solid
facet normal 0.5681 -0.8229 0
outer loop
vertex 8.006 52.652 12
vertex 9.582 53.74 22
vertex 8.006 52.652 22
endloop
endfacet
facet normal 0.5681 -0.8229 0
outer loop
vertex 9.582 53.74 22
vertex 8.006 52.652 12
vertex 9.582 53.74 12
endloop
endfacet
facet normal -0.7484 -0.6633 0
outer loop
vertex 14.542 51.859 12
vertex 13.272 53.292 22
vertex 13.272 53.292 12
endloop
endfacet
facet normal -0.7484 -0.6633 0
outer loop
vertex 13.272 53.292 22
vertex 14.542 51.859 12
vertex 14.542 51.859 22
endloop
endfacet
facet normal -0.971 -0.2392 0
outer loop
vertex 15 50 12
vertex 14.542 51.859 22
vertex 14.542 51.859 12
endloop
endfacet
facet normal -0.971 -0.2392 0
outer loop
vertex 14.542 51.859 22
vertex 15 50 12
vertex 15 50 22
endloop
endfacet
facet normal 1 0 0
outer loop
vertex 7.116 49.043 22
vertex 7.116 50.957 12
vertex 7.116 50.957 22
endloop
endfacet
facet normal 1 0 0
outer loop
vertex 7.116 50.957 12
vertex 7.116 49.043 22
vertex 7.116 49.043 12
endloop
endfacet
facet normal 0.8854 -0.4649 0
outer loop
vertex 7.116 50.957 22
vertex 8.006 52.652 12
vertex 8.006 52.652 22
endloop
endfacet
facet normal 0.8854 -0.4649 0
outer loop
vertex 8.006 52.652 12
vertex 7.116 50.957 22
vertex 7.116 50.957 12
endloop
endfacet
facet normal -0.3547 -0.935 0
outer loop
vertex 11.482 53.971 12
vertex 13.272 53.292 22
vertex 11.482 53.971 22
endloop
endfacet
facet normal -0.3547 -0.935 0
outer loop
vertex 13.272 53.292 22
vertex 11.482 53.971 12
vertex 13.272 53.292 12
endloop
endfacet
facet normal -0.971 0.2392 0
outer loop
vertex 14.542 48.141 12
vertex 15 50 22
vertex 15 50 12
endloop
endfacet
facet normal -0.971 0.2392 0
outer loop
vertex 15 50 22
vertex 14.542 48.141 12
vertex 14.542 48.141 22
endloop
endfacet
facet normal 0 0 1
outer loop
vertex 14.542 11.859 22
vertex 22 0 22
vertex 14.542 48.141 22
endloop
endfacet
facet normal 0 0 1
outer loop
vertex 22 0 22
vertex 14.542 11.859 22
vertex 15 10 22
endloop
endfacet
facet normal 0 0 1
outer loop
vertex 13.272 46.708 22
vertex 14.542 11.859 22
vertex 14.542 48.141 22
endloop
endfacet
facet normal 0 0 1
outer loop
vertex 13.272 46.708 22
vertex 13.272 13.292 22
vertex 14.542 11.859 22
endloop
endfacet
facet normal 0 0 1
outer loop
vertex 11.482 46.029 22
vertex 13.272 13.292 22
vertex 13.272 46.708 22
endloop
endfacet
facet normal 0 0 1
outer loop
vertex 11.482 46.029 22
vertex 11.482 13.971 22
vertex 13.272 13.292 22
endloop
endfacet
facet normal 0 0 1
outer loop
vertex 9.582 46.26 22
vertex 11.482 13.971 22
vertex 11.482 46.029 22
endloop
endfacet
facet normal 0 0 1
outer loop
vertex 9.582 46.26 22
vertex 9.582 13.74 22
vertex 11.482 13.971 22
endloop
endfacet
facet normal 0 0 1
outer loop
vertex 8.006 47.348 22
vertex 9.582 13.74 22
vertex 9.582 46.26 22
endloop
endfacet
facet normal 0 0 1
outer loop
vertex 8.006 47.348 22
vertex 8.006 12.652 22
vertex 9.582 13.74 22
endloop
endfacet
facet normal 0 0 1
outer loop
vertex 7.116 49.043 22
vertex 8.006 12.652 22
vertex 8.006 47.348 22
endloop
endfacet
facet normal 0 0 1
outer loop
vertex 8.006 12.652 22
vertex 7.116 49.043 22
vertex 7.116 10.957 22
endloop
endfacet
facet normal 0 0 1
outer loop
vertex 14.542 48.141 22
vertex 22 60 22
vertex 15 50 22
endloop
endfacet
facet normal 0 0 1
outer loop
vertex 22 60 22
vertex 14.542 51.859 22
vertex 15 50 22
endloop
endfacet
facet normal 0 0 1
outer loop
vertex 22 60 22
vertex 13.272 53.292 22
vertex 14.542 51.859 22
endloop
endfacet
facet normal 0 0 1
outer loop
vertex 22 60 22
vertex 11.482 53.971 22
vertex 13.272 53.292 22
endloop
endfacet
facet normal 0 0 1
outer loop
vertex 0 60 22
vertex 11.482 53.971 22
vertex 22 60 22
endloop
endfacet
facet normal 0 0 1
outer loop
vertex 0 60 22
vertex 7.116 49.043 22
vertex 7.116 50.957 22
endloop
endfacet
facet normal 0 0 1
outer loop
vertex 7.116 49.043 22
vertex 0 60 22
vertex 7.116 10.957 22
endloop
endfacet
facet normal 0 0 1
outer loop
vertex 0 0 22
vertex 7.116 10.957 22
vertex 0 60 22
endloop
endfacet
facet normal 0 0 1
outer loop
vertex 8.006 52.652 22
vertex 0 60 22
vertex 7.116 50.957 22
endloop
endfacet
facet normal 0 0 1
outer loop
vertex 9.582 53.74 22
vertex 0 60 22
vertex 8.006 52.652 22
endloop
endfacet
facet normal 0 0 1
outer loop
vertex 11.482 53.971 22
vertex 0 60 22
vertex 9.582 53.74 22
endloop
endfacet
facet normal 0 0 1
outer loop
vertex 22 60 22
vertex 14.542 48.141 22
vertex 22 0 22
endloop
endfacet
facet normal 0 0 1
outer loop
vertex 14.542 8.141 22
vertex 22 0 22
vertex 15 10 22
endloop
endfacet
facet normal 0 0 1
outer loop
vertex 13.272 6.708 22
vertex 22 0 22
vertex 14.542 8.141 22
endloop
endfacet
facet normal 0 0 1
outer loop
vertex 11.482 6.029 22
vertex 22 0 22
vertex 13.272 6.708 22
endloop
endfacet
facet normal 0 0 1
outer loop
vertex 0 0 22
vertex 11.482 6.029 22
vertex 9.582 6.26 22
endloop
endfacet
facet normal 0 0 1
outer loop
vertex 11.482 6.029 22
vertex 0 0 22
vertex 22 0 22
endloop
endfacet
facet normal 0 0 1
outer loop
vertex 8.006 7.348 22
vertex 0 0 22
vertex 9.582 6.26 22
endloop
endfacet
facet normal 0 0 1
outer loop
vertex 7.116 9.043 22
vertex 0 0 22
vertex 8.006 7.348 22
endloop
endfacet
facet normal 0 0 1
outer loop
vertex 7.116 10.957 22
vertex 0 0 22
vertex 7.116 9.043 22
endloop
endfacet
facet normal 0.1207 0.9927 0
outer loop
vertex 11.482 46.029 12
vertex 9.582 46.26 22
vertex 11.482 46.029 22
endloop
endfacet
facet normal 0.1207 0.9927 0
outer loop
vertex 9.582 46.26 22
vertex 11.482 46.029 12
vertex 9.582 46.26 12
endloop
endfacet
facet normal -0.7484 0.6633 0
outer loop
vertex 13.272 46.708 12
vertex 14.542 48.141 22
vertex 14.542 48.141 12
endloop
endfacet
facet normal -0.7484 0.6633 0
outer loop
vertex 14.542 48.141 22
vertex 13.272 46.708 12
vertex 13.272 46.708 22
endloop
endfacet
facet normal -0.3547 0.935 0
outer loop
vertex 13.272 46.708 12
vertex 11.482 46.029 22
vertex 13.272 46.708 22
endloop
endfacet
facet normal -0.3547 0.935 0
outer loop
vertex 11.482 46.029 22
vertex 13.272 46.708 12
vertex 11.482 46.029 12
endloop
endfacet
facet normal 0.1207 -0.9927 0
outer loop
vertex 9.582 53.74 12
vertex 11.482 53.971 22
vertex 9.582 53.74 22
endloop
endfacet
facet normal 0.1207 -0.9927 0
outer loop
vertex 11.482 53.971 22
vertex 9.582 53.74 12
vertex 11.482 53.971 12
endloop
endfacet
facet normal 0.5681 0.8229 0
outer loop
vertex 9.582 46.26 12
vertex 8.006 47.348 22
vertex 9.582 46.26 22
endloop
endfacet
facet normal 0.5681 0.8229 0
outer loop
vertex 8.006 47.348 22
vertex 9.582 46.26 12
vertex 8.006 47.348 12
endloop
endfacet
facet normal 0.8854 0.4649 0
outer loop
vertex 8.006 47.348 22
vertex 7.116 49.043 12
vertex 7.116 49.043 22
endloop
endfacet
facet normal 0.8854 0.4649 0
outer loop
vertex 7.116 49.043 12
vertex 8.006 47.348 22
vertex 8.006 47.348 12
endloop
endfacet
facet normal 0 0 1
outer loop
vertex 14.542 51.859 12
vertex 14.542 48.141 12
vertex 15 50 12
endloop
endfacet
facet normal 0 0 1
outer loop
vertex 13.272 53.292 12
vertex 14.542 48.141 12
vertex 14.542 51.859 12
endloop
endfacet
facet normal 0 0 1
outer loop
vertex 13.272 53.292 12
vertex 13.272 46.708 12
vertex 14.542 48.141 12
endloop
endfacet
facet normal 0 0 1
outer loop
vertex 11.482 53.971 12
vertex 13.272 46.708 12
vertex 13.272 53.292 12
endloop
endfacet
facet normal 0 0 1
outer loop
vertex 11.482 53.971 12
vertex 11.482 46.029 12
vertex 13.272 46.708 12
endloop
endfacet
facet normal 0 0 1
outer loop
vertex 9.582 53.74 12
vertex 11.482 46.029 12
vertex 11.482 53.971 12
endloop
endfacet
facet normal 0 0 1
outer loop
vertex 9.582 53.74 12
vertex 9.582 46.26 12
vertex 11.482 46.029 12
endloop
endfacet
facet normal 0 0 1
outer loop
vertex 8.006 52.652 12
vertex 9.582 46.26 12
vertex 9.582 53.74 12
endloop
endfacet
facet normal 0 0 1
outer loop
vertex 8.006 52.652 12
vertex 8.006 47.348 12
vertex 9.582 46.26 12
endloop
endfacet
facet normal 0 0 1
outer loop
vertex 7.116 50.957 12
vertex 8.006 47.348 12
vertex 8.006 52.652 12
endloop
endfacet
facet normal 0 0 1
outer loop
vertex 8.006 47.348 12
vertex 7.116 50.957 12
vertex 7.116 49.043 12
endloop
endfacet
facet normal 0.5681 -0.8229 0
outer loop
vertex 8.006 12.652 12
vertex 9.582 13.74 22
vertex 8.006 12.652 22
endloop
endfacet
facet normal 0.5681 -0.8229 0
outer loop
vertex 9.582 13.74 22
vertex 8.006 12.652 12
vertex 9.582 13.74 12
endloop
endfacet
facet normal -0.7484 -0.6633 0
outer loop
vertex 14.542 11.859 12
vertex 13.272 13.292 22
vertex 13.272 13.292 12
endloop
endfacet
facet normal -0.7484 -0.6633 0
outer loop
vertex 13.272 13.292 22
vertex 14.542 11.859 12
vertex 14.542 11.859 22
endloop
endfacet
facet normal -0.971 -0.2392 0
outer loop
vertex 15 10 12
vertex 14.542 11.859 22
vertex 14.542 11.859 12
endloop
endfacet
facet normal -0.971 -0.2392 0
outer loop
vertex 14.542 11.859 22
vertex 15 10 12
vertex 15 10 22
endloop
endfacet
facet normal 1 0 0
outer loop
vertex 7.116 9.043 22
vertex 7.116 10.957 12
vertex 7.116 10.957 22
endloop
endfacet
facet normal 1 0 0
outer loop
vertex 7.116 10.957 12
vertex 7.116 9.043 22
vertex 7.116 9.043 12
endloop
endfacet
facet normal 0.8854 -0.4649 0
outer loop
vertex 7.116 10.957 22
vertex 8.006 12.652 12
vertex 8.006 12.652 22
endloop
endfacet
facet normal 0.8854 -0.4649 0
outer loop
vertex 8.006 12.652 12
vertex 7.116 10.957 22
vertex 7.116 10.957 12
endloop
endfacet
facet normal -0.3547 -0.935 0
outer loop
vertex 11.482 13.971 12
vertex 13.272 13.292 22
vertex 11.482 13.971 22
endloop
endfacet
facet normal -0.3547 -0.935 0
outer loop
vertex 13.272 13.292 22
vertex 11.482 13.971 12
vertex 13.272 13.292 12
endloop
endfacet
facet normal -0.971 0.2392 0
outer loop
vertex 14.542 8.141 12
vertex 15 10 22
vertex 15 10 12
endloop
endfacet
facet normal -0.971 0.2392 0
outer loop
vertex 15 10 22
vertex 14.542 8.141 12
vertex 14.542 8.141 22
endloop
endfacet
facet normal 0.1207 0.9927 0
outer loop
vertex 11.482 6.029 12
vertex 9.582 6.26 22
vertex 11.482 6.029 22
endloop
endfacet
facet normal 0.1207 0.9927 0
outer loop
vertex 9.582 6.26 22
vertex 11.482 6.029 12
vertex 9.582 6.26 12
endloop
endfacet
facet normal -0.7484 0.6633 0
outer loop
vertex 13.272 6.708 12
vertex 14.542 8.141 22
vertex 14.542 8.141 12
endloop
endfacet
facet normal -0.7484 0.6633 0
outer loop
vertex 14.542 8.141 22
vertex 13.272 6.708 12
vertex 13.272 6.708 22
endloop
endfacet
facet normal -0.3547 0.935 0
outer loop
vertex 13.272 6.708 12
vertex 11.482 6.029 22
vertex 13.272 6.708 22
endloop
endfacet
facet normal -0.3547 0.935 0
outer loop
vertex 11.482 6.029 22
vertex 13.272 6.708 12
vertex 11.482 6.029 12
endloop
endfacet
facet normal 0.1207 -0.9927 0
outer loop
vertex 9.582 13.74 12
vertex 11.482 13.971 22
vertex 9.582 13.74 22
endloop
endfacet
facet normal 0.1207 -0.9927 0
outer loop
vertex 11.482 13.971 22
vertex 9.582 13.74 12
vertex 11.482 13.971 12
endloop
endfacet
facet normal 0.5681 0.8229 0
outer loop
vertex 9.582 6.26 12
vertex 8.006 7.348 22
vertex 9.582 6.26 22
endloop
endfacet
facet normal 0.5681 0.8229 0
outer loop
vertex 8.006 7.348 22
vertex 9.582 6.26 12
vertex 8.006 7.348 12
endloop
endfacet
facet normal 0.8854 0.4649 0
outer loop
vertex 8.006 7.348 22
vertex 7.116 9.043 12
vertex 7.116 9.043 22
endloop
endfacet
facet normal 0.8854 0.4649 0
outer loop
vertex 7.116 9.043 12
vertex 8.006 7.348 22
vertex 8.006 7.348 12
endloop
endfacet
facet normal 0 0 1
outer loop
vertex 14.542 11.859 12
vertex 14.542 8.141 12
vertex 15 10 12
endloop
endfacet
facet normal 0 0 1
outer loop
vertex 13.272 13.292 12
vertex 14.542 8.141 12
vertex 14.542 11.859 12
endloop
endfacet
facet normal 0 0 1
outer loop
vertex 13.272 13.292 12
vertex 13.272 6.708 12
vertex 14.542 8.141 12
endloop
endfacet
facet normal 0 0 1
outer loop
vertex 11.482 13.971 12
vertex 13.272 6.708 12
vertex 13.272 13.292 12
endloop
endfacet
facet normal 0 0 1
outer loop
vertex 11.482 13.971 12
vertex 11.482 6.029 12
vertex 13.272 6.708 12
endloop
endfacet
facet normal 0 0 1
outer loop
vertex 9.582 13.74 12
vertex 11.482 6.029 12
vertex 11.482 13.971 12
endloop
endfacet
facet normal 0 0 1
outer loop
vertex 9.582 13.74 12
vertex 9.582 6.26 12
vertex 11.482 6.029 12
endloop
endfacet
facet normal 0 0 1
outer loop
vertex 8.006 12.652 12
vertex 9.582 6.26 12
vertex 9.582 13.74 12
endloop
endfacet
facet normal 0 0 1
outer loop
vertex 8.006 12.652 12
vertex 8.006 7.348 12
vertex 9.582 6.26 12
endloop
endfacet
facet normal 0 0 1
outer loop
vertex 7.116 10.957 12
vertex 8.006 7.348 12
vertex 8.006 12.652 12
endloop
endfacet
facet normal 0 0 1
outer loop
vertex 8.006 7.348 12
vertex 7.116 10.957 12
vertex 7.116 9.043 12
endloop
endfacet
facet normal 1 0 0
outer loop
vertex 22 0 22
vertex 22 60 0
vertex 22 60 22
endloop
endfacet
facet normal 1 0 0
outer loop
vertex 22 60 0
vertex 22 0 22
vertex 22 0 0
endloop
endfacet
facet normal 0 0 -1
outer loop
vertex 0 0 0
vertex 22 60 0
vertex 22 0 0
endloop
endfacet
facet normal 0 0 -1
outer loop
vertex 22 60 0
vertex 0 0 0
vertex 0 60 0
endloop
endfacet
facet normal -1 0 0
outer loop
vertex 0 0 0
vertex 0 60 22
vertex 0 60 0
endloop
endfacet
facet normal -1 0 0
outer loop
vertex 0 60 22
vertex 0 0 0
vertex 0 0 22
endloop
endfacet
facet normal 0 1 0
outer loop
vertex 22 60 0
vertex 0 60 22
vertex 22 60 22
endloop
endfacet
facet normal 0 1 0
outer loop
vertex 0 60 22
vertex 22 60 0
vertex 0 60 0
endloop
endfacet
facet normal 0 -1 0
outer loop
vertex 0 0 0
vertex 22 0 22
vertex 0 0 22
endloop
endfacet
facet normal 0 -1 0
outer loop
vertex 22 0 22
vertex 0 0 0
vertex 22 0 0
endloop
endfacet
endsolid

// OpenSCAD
// simple stop for bottom of loo seat

Height = 60;
Depth = 22;
Width = 22;
Diam = 8;
Sink = 10;
Offset = 10;

difference(){
  cube([Width, Height, Depth]);
  translate([Width/2,Height/2,Depth-Sink]){
  union() {
    translate([0, Height/2-Offset, 0]){
      cylinder(h=Sink, d=Diam);
    }
    translate([0, Offset - Height/2, 0]) {
      cylinder(h=Sink, d=Diam);
    }
  }
  }
}
